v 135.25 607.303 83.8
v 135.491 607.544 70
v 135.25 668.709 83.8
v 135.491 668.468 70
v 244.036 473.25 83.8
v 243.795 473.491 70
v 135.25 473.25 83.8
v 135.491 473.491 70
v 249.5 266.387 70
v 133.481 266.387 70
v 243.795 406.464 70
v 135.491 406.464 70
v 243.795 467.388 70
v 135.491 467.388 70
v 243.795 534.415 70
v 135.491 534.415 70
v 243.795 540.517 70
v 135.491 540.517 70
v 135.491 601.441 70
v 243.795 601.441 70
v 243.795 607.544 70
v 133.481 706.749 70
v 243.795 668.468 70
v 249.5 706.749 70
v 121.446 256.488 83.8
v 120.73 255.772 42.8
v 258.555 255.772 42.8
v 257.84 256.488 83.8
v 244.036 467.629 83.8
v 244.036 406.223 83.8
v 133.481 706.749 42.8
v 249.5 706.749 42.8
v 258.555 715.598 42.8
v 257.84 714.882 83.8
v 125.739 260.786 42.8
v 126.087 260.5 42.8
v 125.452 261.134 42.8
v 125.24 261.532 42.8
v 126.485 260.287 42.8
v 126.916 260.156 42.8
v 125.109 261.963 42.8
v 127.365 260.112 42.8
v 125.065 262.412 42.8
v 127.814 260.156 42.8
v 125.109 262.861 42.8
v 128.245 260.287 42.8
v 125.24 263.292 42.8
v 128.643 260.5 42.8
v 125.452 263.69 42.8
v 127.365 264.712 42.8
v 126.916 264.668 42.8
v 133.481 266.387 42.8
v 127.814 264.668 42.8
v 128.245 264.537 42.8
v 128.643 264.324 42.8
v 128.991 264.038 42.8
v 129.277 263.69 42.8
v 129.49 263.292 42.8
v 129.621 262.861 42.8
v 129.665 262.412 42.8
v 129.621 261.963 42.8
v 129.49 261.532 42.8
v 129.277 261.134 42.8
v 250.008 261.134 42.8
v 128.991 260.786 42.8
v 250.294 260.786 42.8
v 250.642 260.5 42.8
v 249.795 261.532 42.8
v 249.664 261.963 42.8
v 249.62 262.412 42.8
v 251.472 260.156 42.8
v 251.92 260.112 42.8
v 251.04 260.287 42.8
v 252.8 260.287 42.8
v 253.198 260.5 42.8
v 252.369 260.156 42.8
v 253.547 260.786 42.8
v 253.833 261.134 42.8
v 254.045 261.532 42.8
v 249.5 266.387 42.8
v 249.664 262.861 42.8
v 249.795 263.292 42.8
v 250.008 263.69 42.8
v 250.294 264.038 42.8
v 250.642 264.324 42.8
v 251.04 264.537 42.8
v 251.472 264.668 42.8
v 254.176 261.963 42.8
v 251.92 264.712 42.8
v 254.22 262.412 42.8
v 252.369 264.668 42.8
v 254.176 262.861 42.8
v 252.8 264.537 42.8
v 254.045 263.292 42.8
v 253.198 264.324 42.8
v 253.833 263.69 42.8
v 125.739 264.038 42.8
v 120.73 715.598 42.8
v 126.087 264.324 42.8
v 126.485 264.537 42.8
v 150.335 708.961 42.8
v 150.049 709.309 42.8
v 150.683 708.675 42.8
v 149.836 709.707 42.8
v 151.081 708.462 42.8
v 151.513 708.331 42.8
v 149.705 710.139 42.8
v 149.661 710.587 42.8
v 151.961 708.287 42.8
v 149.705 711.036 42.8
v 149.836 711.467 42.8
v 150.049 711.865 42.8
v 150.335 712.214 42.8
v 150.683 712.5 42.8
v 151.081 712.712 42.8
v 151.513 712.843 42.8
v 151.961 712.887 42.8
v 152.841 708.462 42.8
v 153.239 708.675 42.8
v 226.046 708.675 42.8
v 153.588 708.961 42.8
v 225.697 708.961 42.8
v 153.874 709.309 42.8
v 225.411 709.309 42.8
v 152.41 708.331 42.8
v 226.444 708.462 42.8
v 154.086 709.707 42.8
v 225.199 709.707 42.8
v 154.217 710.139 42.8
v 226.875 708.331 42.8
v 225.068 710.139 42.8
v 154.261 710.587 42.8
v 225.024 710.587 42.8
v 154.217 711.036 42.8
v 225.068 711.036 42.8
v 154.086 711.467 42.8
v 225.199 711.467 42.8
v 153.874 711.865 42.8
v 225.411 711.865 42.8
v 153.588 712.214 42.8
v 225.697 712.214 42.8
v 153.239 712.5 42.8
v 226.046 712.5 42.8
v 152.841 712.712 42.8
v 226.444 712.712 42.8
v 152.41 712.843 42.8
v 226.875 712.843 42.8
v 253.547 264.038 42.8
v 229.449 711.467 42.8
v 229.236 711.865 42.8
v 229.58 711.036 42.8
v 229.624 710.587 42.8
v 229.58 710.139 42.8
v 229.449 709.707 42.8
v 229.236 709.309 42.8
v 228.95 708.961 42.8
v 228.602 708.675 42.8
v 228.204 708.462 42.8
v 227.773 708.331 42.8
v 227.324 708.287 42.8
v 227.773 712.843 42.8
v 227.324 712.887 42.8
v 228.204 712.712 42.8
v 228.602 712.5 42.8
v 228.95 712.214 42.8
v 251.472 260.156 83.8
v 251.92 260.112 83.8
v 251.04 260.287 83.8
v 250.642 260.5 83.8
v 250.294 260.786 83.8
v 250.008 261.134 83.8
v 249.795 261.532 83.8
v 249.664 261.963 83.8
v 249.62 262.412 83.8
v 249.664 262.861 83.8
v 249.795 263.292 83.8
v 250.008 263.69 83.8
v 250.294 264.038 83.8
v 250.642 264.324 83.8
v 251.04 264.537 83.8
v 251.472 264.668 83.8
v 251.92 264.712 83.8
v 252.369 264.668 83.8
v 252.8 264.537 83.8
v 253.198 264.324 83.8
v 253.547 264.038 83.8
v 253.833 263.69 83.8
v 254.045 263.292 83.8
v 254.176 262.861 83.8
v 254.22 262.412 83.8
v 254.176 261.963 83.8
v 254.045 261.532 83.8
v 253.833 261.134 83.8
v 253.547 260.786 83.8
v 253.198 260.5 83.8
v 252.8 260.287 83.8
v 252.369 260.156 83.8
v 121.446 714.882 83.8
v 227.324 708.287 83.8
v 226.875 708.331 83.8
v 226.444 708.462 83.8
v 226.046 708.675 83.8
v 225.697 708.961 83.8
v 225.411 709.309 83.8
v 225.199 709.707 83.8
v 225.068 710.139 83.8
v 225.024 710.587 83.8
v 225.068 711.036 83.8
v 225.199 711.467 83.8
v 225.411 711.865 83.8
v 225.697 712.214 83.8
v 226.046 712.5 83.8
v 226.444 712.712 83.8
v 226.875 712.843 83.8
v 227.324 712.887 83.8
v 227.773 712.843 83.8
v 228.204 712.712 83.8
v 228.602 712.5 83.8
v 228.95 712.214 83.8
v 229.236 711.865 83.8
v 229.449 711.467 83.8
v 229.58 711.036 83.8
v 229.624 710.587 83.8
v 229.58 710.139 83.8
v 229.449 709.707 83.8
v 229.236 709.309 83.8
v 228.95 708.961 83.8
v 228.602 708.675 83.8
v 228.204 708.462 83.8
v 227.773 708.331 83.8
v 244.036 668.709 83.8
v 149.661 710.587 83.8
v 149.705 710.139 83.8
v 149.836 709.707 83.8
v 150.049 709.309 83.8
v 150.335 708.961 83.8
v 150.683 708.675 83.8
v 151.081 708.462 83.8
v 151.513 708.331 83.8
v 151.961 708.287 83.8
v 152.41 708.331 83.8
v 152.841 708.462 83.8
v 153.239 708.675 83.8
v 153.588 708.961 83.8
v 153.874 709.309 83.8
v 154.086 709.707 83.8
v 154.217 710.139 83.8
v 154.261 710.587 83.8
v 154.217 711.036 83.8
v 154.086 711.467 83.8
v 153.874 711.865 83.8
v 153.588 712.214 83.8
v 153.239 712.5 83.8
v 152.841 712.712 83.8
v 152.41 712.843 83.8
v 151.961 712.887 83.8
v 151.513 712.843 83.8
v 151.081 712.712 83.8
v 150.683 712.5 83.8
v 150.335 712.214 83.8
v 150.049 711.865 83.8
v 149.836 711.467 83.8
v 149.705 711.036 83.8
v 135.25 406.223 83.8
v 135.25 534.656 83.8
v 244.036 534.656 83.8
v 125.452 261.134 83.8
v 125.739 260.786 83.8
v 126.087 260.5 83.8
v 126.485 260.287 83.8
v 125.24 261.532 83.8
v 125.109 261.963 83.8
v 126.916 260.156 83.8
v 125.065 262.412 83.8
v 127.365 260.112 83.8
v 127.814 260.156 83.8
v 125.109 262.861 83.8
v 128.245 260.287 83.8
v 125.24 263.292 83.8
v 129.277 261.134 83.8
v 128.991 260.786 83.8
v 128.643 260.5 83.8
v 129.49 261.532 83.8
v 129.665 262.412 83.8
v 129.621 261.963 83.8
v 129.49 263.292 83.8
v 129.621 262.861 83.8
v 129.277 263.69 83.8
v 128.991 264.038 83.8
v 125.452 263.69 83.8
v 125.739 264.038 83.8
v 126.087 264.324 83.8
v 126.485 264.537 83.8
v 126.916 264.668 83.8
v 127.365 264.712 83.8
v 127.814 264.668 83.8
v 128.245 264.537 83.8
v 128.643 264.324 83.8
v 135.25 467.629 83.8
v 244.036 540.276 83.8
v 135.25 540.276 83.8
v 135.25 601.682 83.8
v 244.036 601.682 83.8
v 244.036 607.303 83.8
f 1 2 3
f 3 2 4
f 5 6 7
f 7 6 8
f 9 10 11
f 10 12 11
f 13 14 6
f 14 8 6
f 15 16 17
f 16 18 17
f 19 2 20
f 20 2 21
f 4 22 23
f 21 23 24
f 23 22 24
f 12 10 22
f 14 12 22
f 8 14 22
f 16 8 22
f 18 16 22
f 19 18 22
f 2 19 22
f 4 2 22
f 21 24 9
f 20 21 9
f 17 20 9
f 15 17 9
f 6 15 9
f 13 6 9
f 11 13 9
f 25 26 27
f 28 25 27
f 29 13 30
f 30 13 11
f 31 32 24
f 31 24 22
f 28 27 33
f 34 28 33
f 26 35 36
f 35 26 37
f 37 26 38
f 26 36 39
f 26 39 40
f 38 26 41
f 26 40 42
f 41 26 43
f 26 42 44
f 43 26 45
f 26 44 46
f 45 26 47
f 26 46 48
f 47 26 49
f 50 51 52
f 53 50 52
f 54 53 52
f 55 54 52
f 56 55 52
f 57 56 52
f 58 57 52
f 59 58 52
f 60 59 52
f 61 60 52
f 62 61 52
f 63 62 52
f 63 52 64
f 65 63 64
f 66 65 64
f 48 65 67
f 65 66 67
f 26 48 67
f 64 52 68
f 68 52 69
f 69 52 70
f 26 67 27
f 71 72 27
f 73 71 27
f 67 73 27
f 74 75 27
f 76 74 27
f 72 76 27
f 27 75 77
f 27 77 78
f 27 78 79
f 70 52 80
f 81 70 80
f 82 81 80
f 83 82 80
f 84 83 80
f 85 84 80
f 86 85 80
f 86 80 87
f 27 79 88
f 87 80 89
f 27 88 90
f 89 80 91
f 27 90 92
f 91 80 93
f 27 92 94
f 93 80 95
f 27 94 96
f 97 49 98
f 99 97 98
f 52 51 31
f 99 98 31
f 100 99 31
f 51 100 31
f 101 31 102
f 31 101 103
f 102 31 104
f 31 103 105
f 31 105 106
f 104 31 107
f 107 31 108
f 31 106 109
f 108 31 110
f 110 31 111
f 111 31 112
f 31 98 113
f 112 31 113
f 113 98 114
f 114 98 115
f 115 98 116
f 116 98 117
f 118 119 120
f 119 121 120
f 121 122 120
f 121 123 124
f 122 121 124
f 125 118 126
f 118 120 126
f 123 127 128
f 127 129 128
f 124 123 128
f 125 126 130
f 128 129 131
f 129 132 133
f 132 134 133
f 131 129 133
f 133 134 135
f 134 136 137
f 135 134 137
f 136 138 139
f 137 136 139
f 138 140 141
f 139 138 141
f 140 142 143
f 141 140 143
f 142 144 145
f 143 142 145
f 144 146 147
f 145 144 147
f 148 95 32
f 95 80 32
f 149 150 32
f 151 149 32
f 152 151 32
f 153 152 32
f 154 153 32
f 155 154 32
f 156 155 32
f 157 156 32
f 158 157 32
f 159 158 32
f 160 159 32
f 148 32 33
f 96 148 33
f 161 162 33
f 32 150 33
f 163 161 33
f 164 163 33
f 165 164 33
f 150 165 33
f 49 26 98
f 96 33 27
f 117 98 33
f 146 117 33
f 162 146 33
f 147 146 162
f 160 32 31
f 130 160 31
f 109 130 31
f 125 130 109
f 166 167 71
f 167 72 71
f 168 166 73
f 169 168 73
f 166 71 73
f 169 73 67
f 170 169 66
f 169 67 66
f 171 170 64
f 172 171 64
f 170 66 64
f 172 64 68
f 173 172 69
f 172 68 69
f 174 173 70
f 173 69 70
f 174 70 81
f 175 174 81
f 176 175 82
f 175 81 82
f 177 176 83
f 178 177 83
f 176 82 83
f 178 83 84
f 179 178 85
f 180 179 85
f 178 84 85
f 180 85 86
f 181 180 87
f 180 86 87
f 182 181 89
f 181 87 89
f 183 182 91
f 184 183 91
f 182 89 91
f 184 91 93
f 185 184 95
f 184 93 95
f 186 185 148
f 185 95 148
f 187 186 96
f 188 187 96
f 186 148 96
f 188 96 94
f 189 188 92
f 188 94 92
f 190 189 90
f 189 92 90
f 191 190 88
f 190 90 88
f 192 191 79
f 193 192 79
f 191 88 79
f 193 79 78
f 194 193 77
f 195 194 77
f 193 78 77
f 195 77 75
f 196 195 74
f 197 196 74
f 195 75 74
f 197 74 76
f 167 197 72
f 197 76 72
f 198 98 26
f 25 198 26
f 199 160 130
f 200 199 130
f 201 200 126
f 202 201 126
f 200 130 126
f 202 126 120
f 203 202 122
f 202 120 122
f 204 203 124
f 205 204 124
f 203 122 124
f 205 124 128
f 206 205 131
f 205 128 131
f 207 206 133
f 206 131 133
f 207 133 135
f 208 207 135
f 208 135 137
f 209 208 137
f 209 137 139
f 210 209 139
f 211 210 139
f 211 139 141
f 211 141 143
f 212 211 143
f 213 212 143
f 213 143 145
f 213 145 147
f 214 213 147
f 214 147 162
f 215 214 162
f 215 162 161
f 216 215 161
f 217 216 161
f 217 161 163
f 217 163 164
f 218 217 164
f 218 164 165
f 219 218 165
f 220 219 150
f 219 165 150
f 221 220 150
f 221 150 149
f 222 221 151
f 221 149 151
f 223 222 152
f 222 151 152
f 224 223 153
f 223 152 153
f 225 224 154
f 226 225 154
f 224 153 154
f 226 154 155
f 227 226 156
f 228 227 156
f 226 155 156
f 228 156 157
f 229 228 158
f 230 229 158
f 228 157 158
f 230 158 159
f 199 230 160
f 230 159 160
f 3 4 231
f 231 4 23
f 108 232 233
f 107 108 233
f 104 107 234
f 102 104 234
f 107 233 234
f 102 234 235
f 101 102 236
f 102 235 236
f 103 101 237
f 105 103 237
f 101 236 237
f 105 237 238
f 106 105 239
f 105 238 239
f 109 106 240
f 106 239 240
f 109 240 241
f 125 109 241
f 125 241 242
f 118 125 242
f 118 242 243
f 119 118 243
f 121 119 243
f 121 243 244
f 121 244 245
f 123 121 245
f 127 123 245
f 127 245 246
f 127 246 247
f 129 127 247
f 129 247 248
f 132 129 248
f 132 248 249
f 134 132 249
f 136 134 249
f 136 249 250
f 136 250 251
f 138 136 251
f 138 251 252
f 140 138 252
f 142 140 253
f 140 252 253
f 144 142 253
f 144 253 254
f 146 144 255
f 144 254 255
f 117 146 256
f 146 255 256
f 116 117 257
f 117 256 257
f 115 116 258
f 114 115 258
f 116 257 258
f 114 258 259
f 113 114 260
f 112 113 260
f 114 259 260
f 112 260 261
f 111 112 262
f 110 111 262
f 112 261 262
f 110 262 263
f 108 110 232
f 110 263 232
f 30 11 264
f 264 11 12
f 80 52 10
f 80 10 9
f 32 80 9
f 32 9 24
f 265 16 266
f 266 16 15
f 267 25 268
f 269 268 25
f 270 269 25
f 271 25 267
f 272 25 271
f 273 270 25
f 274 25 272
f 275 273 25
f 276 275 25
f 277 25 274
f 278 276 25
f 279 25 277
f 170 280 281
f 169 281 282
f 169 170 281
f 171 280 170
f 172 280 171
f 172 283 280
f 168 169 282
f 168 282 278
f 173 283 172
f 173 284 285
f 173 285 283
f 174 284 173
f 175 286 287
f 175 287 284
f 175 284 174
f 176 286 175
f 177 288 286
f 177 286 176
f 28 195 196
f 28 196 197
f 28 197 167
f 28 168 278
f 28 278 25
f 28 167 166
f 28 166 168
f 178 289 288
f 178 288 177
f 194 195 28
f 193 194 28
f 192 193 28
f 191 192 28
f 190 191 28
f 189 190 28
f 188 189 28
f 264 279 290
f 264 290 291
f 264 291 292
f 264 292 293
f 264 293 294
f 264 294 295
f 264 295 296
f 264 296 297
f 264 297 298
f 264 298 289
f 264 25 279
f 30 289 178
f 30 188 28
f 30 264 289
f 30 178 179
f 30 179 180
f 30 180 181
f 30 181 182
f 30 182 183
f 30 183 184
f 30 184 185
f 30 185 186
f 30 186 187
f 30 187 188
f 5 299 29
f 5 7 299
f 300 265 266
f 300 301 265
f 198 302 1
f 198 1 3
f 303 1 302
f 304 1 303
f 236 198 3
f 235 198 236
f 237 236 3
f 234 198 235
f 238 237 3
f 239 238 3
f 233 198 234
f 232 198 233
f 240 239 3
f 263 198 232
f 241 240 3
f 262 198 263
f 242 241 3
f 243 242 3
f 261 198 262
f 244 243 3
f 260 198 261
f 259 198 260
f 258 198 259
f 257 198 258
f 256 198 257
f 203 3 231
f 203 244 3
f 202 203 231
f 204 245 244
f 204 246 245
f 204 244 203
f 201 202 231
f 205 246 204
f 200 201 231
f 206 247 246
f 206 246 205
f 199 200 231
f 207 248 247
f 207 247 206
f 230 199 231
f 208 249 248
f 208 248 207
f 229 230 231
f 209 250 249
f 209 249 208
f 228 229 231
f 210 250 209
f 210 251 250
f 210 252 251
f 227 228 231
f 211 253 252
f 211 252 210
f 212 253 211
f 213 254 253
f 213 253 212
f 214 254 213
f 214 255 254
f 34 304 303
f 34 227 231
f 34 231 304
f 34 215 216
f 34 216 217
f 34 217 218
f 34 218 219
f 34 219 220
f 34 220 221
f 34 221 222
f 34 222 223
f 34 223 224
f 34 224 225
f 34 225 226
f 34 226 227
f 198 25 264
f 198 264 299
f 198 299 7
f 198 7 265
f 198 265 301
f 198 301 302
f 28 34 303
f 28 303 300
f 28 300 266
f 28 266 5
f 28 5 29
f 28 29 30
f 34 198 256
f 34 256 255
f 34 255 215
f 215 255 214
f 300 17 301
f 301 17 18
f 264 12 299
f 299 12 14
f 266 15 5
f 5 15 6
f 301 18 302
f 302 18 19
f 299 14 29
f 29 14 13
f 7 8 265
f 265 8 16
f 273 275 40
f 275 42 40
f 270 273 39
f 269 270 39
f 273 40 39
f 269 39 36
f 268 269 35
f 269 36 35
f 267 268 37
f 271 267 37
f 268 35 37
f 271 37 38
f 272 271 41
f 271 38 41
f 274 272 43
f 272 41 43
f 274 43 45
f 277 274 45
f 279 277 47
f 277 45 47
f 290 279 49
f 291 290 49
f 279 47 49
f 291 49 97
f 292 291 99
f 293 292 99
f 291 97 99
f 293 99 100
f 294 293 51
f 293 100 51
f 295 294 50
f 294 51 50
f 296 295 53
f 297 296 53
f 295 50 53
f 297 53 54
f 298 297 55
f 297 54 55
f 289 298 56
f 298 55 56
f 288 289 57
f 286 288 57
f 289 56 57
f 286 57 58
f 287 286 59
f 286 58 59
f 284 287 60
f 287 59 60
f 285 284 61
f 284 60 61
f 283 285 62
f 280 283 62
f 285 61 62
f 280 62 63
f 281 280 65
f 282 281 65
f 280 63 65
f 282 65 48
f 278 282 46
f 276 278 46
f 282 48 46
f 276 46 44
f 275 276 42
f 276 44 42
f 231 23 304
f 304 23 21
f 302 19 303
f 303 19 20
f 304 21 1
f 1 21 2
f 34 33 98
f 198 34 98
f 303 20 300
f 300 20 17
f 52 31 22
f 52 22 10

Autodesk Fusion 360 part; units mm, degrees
sketch "Sketch1" plane through (0, 0, 0) normal (0, 0, 1) x (1, 0, 0)
  line L0 (-23.9272, 0) -> (276.0728, 0)
  line L1 (276.0728, 0) -> (276.0728, 1000)
  line L2 (276.0728, 1000) -> (-23.9272, 1000)
  line L3 (-23.9272, 1000) -> (-23.9272, 0)
  line L4 (9.5728, 896.1324) -> (242.5728, 896.1324)
  line L5 (242.5728, 896.1324) -> (242.5728, 766.1324)
  line L6 (242.5728, 766.1324) -> (9.5728, 766.1324)
  line L7 (9.5728, 766.1324) -> (9.5728, 896.1324)
  line L8 (9.5728, 750.4224) -> (242.5728, 750.4224)
  line L9 (242.5728, 750.4224) -> (242.5728, 620.4224)
  line L10 (242.5728, 620.4224) -> (9.5728, 620.4224)
  line L11 (9.5728, 620.4224) -> (9.5728, 750.4224)
  line L12 (9.5728, 604.7124) -> (242.5728, 604.7124)
  line L13 (242.5728, 604.7124) -> (242.5728, 474.7124)
  line L14 (242.5728, 474.7124) -> (9.5728, 474.7124)
  line L15 (9.5728, 474.7124) -> (9.5728, 604.7124)
  line L16 (9.5728, 459.0024) -> (242.5728, 459.0024)
  line L17 (242.5728, 459.0024) -> (242.5728, 329.0024)
  line L18 (242.5728, 329.0024) -> (9.5728, 329.0024)
  line L19 (9.5728, 329.0024) -> (9.5728, 459.0024)
  dimension "d1" = 300
  dimension "d2" = 1000
  dimension "d3" = 130
  dimension "d4" = 130
  dimension "d5" = 233
  dimension "d6" = 233
  dimension "d7" = 33.5
  dimension "d8" = 33.5
  dimension "d9" = 15.71
  dimension "d10" = 15.71
  dimension "d11" = 15.71
  dimension "d12" = 15.71
  dimension "d13" = 15.71
  dimension "d14" = 15.71
extrude "Extrude1" add sketch "Sketch1" along normal blind 100 draft -1
sketch "Sketch2" plane through (0, 0, 0) normal (0, 0, 1) x (1, 0, 0)
  line L0 (256.197, 980.5748) -> (3.983, 980.5748)
  line L1 (3.983, 980.5748) -> (3.983, 23.2664)
  line L2 (3.983, 23.2664) -> (256.197, 23.2664)
  line L3 (256.197, 23.2664) -> (256.197, 980.5748)
extrude "Extrude2" cut sketch "Sketch2" along normal blind 70
hole "Hole1" at (-9.3135, 14.624, 100) direction (0, 0, -1) diameter 10 depth 100 tip angle 118
sketch "Sketch3" plane through (0, 0, 100) normal (0, 0, 1) x (-1, 0, 0)
  circle A0 centre (9.3135, -14.624) radius 5
  line L0 (-7.8273, -764.3868) -> (-7.8273, -897.8779)
  line L1 (-7.8273, -897.8779) -> (-244.3183, -897.8779)
  line L2 (-244.3183, -897.8779) -> (-244.3183, -764.3868)
  line L3 (-244.3183, -764.3868) -> (-7.8273, -764.3868)
  line L4 (-7.8273, -618.6768) -> (-7.8273, -752.1679)
  line L5 (-7.8273, -752.1679) -> (-244.3183, -752.1679)
  line L6 (-244.3183, -752.1679) -> (-244.3183, -618.6768)
  line L7 (-244.3183, -618.6768) -> (-7.8273, -618.6768)
  line L8 (-7.8273, -472.9668) -> (-7.8273, -606.4579)
  line L9 (-7.8273, -606.4579) -> (-244.3183, -606.4579)
  line L10 (-244.3183, -606.4579) -> (-244.3183, -472.9668)
  line L11 (-244.3183, -472.9668) -> (-7.8273, -472.9668)
  line L12 (-7.8273, -327.2568) -> (-7.8273, -460.7479)
  line L13 (-7.8273, -460.7479) -> (-244.3183, -460.7479)
  line L14 (-244.3183, -460.7479) -> (-244.3183, -327.2568)
  line L15 (-244.3183, -327.2568) -> (-7.8273, -327.2568)
  line L16 (-274.3273, -998.2545) -> (22.1817, -998.2545)
  line L17 (22.1817, -998.2545) -> (22.1817, -1.7455)
  line L18 (22.1817, -1.7455) -> (-274.3273, -1.7455)
  line L19 (-274.3273, -1.7455) -> (-274.3273, -998.2545)
  circle A1 centre (-261.4591, -14.624) radius 5
  point P0 (-126.0728, -1.7455)
  dimension "d22" = 12.8682
  dimension "d23" = 12.8785
hole "Hole2" at (261.4591, 14.624, 100) direction (0, 0, -1) diameter 10 depth 119 tip angle 118
hole "Hole3" at (207.9885, 988.9182, 100) direction (0, 0, -1) diameter 10 depth 120 tip angle 118
sketch "Sketch4" plane through (0, 0, 100) normal (0, 0, 1) x (-1, 0, 0)
  circle A0 centre (-207.9885, -988.9182) radius 5
  circle A1 centre (-261.4591, -14.624) radius 5
  circle A2 centre (9.3135, -14.624) radius 5
  line L0 (-7.8273, -764.3868) -> (-7.8273, -897.8779)
  line L1 (-7.8273, -897.8779) -> (-244.3183, -897.8779)
  line L2 (-244.3183, -897.8779) -> (-244.3183, -764.3868)
  line L3 (-244.3183, -764.3868) -> (-7.8273, -764.3868)
  line L4 (-7.8273, -618.6768) -> (-7.8273, -752.1679)
  line L5 (-7.8273, -752.1679) -> (-244.3183, -752.1679)
  line L6 (-244.3183, -752.1679) -> (-244.3183, -618.6768)
  line L7 (-244.3183, -618.6768) -> (-7.8273, -618.6768)
  line L8 (-7.8273, -472.9668) -> (-7.8273, -606.4579)
  line L9 (-7.8273, -606.4579) -> (-244.3183, -606.4579)
  line L10 (-244.3183, -606.4579) -> (-244.3183, -472.9668)
  line L11 (-244.3183, -472.9668) -> (-7.8273, -472.9668)
  line L12 (-7.8273, -327.2568) -> (-7.8273, -460.7479)
  line L13 (-7.8273, -460.7479) -> (-244.3183, -460.7479)
  line L14 (-244.3183, -460.7479) -> (-244.3183, -327.2568)
  line L15 (-244.3183, -327.2568) -> (-7.8273, -327.2568)
  line L16 (-274.3273, -998.2545) -> (22.1817, -998.2545)
  line L17 (22.1817, -998.2545) -> (22.1817, -1.7455)
  line L18 (22.1817, -1.7455) -> (-274.3273, -1.7455)
  line L19 (-274.3273, -1.7455) -> (-274.3273, -998.2545)
  circle A3 centre (-44.157, -988.9182) radius 5
  point P0 (-126.0728, -998.2545)
  dimension "d39" = 163.8315
extrude "Extrude3" cut sketch "Sketch4" against normal blind 300 contours A3
sketch "Sketch5" plane through (0, 765.899, 13.3688) normal (0, 0.9998, 0.0175) x (-1, 0, 0)
  line L0 (-243.7946, 56.6398) -> (-8.3509, 56.6398)
  line L1 (-8.3509, 56.6398) -> (-7.8273, 86.6444)
  line L2 (-7.8273, 86.6444) -> (-244.3183, 86.6444)
  line L3 (-244.3183, 86.6444) -> (-243.7946, 56.6398)
  dimension "d32" = 30.0046
sketch "Sketch6" plane through (-23.9199, 0, 0.4175) normal (-0.9998, 0, 0.0175) x (0, -1, 0)
  line L0 (-1.7455, 99.5976) -> (-998.2545, 99.5976)
  line L1 (-998.2545, 99.5976) -> (-1000, -0.4176)
  line L2 (-1000, -0.4176) -> (0, -0.4176)
  line L3 (0, -0.4176) -> (-1.7455, 99.5976)
  dimension "d33" = 100.0152
scale "Scale1" factor 0.46 about (243.7946, 473.4905, 70) bodies 1
sketch "Sketch7" plane through (0, 0, 83.8) normal (0, 0, 1) x (-1, 0, 0)
  line L0 (-257.8396, -714.8819) -> (-121.4455, -714.8819)
  line L1 (-121.4455, -714.8819) -> (-121.4455, -256.4878)
  line L2 (-121.4455, -256.4878) -> (-257.8396, -256.4878)
  line L3 (-257.8396, -256.4878) -> (-257.8396, -714.8819)
  line L4 (-135.2496, -406.223) -> (-135.2496, -467.6289)
  line L5 (-135.2496, -467.6289) -> (-244.0355, -467.6289)
  line L6 (-244.0355, -467.6289) -> (-244.0355, -406.223)
  line L7 (-244.0355, -406.223) -> (-135.2496, -406.223)
  line L8 (-135.2496, -473.2496) -> (-135.2496, -534.6555)
  line L9 (-135.2496, -534.6555) -> (-244.0355, -534.6555)
  line L10 (-244.0355, -534.6555) -> (-244.0355, -473.2496)
  line L11 (-244.0355, -473.2496) -> (-135.2496, -473.2496)
  line L12 (-135.2496, -540.2762) -> (-135.2496, -601.6821)
  line L13 (-135.2496, -601.6821) -> (-244.0355, -601.6821)
  line L14 (-244.0355, -601.6821) -> (-244.0355, -540.2762)
  line L15 (-244.0355, -540.2762) -> (-135.2496, -540.2762)
  line L16 (-135.2496, -607.3028) -> (-135.2496, -668.7087)
  line L17 (-135.2496, -668.7087) -> (-244.0355, -668.7087)
  line L18 (-244.0355, -668.7087) -> (-244.0355, -607.3028)
  line L19 (-244.0355, -607.3028) -> (-135.2496, -607.3028)
  circle A0 centre (-127.3649, -262.4119) radius 2.3
  circle A1 centre (-251.9203, -262.4119) radius 2.3
  circle A2 centre (-227.3238, -710.5872) radius 2.3
  circle A3 centre (-151.9613, -710.5872) radius 2.3
  dimension "d35" = 61.4059
  dimension "d36" = 108.7859
sketch "Sketch8" plane through (0, 716.1265, 12.5) normal (0, 0.9998, 0.0175) x (-1, 0, 0)
  line L0 (-121.4455, 71.3108) -> (-257.8396, 71.3108)
  line L1 (-257.8396, 71.3108) -> (-258.6426, 25.3038)
  line L2 (-258.6426, 25.3038) -> (-120.6426, 25.3038)
  line L3 (-120.6426, 25.3038) -> (-121.4455, 71.3108)
  line L4 (-257.8396, 71.3108) -> (-121.4455, 71.3108)
  dimension "d37" = 46.007
sketch "Sketch9" plane through (0, 0, 83.8) normal (0, 0, 1) x (-1, 0, 0)
  circle A0 centre (-151.9613, -710.5872) radius 2.3
  point P0 (-185, -715)
  point P1 (-187.4151, -715)
  point P2 (-227.3238, -710.5872)
  point P3 (-151.9613, -710.5872)
  dimension "d38" = 4.6
  dimension "d40" = 75.3625
sketch "Sketch10" plane through (0, 0, 83.8) normal (0, 0, 1) x (-1, 0, 0)
  line L0 (-257.8396, -256.4878) -> (-257.8396, -714.8819)
  line L1 (-121.4455, -714.8819) -> (-121.4455, -256.4878)
  line L2 (-121.4455, -256.4878) -> (-257.8396, -256.4878)
  circle A0 centre (-151.9613, -710.5872) radius 2.3
  line L3 (-257.8396, -714.8819) -> (-121.4455, -714.8819)
  point P0 (-127.3649, -262.4119)
  point P1 (-151.9613, -710.5872)
  dimension "d41" = 136.3941
  dimension "d42" = 458.3941
  dimension "d43" = 5.9194
  dimension "d44" = 5.9241
  dimension "d45" = 4.6
  dimension "d46" = 4.2947
  dimension "d47" = 30.5158
extrude "Extrude4" cut 1 faces at (126.6208, 562.1575, 37.8) along direction (0, 0, 1) blind 5
